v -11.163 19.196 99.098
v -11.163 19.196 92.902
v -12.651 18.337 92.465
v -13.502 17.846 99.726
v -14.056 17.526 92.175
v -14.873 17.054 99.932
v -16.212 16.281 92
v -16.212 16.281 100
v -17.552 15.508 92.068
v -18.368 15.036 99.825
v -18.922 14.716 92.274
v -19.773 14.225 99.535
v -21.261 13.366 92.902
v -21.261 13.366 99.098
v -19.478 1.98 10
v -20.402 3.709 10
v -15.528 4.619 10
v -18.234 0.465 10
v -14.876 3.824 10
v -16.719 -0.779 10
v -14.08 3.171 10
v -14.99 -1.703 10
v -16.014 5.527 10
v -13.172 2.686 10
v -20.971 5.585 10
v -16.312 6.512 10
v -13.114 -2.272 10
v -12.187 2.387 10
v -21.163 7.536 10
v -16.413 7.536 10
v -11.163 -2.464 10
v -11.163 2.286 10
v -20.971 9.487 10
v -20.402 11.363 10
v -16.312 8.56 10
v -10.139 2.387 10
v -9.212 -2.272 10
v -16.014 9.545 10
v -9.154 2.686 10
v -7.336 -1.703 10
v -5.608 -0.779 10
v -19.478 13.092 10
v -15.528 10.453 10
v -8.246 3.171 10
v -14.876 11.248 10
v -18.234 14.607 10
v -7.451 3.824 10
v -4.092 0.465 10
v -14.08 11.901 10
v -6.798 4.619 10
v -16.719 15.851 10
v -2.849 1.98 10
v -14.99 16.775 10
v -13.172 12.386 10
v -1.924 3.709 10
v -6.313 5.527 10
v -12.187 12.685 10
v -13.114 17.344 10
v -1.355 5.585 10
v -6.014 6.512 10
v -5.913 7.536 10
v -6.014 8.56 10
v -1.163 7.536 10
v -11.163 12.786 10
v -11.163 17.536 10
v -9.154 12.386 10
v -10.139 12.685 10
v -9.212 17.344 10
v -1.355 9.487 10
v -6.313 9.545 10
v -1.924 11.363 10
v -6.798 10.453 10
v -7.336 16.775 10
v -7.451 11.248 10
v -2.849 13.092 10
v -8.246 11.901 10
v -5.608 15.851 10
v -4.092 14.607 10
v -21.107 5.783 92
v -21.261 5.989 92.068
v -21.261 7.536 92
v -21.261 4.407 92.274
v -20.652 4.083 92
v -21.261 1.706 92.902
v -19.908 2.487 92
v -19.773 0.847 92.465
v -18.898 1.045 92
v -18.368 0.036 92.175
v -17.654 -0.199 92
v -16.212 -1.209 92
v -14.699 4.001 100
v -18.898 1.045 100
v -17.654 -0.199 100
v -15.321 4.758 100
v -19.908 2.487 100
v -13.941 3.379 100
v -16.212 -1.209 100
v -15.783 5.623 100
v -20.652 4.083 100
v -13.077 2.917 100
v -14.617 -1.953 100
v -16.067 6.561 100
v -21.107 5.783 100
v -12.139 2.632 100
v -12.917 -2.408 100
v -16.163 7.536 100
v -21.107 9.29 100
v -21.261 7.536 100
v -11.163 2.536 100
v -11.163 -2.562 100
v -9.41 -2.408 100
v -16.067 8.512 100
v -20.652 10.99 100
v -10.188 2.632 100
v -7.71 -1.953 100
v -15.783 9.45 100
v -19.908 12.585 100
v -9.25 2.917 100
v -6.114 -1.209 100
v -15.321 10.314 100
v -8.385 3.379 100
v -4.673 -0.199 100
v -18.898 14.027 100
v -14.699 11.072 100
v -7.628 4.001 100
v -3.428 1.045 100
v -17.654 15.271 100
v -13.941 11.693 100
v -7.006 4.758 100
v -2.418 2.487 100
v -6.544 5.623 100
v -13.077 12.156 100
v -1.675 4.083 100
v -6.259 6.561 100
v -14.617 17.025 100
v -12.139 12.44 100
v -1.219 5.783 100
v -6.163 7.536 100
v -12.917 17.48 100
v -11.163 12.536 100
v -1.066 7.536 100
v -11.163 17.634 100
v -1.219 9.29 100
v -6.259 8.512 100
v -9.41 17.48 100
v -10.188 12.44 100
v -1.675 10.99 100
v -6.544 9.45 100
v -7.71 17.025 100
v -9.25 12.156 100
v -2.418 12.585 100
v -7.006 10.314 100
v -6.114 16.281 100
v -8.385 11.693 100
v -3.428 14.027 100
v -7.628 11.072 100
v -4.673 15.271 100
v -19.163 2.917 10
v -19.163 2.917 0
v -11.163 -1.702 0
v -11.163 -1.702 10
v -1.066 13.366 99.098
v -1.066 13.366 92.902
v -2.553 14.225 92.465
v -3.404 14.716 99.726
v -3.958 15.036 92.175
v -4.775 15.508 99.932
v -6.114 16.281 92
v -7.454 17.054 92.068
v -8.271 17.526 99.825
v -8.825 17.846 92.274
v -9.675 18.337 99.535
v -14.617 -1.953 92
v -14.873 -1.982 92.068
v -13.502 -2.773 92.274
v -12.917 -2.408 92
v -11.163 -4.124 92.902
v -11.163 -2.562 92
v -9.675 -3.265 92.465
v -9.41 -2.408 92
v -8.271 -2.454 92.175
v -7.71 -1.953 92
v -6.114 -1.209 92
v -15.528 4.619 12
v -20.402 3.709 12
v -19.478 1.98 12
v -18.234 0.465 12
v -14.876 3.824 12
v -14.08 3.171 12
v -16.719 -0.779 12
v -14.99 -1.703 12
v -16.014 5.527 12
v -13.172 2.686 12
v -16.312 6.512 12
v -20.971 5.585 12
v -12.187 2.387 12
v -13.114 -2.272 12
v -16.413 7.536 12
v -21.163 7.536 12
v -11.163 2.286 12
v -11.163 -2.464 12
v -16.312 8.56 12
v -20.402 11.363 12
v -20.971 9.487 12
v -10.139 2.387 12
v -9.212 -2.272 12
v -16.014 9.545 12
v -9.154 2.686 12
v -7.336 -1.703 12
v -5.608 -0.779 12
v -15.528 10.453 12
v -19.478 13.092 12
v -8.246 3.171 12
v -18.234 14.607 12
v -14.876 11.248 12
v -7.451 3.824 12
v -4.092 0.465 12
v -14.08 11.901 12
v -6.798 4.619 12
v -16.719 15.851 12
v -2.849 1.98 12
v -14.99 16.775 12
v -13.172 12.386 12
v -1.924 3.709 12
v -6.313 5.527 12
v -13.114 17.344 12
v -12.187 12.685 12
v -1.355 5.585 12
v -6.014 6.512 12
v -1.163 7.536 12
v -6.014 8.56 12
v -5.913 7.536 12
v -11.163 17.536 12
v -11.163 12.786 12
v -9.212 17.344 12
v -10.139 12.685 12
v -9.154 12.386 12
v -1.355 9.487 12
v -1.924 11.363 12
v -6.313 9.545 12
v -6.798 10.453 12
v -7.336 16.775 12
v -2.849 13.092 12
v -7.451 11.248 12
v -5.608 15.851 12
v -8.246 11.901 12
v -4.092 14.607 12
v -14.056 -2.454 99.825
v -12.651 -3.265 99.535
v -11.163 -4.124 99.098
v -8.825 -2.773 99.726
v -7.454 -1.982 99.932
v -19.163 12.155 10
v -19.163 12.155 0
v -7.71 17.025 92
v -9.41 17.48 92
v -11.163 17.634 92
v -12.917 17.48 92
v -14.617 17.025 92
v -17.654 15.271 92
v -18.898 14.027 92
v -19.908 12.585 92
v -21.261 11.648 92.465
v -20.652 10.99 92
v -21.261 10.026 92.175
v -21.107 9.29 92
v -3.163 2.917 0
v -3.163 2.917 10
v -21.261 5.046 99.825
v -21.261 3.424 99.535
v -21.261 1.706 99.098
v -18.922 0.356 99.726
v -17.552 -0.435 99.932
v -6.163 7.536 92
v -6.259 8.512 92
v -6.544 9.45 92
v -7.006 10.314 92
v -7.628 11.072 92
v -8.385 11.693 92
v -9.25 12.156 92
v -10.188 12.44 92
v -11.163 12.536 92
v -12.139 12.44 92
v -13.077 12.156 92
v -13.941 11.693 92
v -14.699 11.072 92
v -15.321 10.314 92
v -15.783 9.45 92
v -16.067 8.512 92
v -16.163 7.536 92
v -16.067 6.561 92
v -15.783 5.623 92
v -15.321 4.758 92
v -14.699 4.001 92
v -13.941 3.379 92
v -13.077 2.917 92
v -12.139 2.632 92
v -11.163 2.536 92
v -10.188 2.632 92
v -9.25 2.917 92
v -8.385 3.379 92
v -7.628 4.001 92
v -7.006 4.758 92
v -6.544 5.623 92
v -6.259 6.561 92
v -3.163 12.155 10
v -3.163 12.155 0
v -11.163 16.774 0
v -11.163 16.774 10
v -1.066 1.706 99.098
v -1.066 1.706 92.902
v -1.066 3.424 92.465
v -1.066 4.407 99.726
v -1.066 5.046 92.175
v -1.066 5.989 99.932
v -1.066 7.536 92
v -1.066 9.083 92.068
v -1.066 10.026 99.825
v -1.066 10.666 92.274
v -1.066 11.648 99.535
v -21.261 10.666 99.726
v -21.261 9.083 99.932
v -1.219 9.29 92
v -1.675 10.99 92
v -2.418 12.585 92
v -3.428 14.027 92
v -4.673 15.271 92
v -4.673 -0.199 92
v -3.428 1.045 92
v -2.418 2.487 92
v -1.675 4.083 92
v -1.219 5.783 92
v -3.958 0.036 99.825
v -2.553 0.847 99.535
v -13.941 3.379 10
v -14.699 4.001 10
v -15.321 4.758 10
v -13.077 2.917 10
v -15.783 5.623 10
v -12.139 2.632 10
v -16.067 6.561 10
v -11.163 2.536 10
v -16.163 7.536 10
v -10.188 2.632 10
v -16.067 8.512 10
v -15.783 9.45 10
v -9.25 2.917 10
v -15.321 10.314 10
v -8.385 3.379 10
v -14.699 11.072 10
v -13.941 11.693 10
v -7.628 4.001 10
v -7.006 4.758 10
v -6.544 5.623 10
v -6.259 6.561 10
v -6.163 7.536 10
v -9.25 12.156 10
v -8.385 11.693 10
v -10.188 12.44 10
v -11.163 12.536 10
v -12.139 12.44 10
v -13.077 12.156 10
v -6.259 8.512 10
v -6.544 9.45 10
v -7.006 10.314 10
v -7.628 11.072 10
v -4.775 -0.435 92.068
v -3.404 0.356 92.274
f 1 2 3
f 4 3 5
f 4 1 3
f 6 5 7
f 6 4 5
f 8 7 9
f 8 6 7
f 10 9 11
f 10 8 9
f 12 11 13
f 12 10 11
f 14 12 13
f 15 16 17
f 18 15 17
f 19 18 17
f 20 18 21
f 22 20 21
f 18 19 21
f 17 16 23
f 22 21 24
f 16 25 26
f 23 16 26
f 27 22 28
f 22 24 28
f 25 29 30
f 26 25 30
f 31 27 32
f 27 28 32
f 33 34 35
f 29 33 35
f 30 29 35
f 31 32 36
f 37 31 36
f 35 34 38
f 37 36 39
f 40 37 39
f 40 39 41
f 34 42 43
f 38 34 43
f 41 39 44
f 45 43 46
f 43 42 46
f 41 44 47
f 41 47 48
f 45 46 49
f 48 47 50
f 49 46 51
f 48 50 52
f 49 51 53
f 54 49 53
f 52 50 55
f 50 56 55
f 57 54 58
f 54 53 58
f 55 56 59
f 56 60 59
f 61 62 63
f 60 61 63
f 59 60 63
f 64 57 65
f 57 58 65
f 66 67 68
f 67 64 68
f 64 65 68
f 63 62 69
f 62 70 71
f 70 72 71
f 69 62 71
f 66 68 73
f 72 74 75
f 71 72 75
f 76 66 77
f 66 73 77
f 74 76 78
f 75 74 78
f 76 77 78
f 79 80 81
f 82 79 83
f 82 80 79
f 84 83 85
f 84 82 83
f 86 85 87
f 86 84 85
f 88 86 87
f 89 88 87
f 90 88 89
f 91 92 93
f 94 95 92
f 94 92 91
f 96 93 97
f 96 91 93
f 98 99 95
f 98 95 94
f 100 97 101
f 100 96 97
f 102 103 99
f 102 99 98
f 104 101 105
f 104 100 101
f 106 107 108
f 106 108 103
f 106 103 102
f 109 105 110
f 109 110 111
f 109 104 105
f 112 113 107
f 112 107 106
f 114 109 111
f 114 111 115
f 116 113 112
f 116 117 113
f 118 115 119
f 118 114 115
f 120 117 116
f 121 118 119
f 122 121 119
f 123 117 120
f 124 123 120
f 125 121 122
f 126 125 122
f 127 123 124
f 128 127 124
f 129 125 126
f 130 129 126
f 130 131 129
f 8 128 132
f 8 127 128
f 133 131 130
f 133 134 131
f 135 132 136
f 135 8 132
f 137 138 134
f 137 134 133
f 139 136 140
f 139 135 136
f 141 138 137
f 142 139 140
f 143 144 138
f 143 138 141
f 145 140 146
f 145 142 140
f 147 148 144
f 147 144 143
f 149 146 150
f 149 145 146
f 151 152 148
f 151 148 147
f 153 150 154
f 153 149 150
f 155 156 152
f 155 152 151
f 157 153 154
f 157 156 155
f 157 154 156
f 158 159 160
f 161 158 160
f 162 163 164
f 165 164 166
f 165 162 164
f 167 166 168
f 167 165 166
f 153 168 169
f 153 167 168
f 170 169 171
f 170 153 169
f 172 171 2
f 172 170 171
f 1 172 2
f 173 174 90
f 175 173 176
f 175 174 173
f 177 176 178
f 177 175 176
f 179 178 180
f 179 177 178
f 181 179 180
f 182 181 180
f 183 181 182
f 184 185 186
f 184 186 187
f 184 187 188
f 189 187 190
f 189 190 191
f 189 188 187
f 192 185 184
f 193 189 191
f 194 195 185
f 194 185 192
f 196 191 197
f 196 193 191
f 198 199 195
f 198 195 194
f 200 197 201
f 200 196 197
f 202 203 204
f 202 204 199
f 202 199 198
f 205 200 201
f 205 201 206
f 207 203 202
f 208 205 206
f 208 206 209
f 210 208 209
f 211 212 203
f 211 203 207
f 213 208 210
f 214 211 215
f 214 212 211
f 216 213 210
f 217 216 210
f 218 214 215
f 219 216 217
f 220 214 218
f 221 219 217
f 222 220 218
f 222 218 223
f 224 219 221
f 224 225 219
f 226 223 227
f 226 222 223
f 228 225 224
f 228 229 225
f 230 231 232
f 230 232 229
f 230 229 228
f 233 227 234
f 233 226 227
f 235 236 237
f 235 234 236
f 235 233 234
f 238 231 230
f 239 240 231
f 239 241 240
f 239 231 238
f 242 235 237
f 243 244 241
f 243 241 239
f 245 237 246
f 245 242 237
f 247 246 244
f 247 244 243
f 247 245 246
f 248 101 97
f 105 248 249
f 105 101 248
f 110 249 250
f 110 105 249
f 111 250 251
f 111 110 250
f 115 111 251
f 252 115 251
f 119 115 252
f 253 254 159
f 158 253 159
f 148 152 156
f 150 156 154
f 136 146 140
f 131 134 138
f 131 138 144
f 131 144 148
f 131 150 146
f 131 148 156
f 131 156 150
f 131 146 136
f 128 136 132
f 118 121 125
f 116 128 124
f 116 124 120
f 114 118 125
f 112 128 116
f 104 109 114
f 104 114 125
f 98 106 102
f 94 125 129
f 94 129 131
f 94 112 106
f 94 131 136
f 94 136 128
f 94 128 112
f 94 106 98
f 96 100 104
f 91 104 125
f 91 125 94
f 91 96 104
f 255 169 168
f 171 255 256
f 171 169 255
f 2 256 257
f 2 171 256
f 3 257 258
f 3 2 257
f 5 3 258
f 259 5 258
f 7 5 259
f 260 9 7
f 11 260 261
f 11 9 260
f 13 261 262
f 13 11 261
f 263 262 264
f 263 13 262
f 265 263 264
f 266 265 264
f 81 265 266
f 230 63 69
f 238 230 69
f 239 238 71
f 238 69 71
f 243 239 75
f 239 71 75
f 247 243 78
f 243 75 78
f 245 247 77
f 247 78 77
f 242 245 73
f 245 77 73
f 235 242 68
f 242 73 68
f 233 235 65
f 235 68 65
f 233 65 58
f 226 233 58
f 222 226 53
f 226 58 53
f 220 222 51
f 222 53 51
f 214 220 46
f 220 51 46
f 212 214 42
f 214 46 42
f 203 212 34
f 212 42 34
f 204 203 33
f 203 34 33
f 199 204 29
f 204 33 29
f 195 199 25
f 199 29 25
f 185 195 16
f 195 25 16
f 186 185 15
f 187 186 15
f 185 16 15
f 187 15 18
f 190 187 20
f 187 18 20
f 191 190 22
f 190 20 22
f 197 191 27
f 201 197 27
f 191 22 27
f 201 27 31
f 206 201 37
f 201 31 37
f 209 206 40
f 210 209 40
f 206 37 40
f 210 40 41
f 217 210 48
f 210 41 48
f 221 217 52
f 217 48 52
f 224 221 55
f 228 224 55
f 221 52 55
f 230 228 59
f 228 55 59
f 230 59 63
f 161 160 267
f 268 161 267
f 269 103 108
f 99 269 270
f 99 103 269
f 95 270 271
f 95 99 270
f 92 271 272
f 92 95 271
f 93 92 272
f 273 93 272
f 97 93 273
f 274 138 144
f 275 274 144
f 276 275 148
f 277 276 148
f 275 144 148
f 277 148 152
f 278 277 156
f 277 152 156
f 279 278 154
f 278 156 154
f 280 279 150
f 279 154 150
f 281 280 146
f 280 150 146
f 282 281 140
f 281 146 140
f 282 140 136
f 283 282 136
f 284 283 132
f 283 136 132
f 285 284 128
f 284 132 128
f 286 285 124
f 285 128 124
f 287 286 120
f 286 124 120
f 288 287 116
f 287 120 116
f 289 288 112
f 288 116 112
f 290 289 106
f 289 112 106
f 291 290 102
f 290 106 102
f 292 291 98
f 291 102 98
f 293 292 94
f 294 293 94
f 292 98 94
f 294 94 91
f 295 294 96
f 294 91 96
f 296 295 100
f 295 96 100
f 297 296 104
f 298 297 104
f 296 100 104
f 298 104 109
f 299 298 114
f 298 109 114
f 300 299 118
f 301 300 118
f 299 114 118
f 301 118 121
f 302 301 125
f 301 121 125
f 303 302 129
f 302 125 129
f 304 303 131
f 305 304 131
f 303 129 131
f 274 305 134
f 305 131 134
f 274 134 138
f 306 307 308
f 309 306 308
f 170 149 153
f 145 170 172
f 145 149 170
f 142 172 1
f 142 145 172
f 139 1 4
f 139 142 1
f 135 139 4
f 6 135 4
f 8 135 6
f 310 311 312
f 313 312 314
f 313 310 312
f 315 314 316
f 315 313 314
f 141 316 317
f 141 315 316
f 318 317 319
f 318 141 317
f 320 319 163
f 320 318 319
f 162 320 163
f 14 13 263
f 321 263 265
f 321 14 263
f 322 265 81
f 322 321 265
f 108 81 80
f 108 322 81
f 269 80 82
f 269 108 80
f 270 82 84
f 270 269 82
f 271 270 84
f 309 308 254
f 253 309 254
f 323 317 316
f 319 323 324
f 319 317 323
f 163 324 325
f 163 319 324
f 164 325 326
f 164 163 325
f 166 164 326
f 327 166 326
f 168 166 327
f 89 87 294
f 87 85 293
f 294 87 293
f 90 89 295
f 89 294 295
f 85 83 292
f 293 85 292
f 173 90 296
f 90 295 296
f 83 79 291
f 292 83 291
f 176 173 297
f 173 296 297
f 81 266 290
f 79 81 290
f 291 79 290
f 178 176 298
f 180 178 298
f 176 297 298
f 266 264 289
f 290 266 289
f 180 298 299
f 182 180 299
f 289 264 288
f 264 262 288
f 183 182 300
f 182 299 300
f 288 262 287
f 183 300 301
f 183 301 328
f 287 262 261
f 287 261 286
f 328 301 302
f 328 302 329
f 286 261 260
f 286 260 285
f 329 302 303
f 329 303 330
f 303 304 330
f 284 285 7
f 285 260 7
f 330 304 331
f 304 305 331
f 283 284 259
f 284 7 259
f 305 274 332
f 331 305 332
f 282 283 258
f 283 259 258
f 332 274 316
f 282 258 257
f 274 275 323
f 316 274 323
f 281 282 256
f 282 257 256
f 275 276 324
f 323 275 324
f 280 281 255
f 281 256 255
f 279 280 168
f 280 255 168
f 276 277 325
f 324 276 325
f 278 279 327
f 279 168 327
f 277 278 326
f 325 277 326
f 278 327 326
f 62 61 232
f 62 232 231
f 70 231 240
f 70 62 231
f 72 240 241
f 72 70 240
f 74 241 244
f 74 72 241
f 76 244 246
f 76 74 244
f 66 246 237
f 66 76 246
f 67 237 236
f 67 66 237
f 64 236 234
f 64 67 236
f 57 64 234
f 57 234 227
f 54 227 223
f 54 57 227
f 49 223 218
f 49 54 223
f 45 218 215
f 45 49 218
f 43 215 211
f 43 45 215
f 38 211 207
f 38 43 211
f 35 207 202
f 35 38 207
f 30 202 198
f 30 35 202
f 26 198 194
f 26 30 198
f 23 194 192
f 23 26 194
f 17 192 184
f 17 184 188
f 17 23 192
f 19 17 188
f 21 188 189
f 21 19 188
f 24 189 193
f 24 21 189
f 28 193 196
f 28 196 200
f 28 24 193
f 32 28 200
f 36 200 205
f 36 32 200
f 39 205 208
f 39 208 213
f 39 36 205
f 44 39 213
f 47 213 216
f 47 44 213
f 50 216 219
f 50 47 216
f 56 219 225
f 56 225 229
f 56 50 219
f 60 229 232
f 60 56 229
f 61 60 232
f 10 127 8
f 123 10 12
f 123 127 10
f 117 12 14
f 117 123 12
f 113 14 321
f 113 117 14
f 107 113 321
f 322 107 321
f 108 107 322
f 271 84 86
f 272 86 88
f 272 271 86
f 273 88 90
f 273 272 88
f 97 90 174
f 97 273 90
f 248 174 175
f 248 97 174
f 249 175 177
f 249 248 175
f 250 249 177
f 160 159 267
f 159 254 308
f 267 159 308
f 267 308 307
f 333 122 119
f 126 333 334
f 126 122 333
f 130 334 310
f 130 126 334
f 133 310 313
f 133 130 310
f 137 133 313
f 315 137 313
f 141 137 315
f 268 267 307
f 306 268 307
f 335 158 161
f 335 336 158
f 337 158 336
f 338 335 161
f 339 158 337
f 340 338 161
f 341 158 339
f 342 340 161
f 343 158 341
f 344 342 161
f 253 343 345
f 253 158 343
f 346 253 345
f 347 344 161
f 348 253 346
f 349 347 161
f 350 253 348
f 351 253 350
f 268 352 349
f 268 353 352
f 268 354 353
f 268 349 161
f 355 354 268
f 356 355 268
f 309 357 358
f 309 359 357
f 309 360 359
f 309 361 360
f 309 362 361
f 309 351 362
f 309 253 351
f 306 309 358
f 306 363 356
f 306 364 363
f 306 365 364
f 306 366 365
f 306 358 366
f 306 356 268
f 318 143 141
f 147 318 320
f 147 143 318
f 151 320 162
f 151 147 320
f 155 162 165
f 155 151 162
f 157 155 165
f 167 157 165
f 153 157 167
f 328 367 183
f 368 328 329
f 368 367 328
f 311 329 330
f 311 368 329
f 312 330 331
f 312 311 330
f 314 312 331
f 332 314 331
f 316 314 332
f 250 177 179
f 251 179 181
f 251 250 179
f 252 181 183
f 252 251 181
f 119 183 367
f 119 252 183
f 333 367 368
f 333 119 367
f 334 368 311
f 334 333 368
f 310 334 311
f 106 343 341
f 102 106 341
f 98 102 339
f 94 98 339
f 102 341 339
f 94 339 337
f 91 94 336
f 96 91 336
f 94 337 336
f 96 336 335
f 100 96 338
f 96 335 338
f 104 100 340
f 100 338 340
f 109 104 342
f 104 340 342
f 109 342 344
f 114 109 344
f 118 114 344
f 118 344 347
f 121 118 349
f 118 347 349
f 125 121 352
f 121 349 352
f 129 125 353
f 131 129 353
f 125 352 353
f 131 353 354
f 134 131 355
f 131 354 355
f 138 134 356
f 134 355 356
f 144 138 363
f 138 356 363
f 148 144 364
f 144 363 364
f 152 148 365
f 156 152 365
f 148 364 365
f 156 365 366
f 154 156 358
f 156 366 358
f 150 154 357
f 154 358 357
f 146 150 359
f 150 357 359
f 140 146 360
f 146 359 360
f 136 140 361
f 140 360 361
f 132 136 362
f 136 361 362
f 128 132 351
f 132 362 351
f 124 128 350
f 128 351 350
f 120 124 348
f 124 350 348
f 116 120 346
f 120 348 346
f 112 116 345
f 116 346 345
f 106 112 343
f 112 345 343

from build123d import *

# Parameters (mm, degrees)
SKETCH1_R           = 5
BOSS_EXTRUDE1_DEPTH = 10
BOSS_EXTRUDE2_START = 10
SKETCH1_3_R         = 5
BOSS_EXTRUDE2_DEPTH = 90
BOSS_EXTRUDE3_START = 10
SKETCH3_R           = 10
SKETCH3_R_2         = 5.25
BOSS_EXTRUDE3_DEPTH = 2
SKETCH4_R           = 5
BOSS_EXTRUDE4_DEPTH = 8


with BuildPart() as part:
    # Sketch1 → Boss-Extrude1 (new body)
    # profile 1 of 2: a face of its own
    with BuildSketch(Plane.XY):
        Polygon((-11.163210479, -1.701501358), (-3.163210479, 2.917300796), (-3.163210479, 12.154905103), (-11.163210479, 16.773707256), (-19.163210479, 12.154905103), (-19.163210479, 2.917300796), align=None)
        with Locations((-11.163210479, 7.536102949)):
            Circle(SKETCH1_R, mode=Mode.SUBTRACT)
    # profile 2 of 2: a face of its own
    with BuildSketch(Plane.XY):
        with Locations((-11.163210479, 7.536102949)):
            Circle(SKETCH1_R)
    extrude(amount=BOSS_EXTRUDE1_DEPTH)

    # Sketch1<3> → Boss-Extrude2 (add)
    with BuildSketch(Plane.XY.offset(BOSS_EXTRUDE2_START)):
        with Locations(Location((-11.163210479, 7.536102949, 0), (0, 0, 180))):
            Circle(SKETCH1_3_R)
    extrude(amount=BOSS_EXTRUDE2_DEPTH)


with BuildPart() as body_2:
    # Sketch3 → Boss-Extrude3 (new body)
    with BuildSketch(Plane.XY.offset(BOSS_EXTRUDE3_START)):
        with Locations((-11.163210479, 7.536102949)):
            Circle(SKETCH3_R)
        with Locations((-11.163210479, 7.536102949)):
            Circle(SKETCH3_R_2, mode=Mode.SUBTRACT)
    extrude(amount=BOSS_EXTRUDE3_DEPTH)


with BuildPart() as body_3:
    # Sketch4 → Boss-Extrude4 (new body)
    with BuildSketch(Plane.XY.offset(100)):
        Polygon((-11.163210479, -4.123618998), (-1.065595071, 1.706241975), (-1.065595071, 13.365963923), (-11.163210479, 19.195824897), (-21.260825886, 13.365963923), (-21.260825886, 1.706241975), align=None)
        with Locations((-11.163210479, 7.536102949)):
            Circle(SKETCH4_R, mode=Mode.SUBTRACT)
    extrude(amount=-BOSS_EXTRUDE4_DEPTH)

    # Sketch5 → Cut-Revolve1 (revolve, cut)
    with BuildSketch(Plane(origin=(0, 7.536102949, 0), x_dir=(-1, 0, 0), z_dir=(0, -1, 0))):
        Polygon((28.189029116, -96), (14.332622656, -104), (14.332622656, -108.5), (39.332622656, -108.5), (39.332622656, -83.5), (14.332622656, -83.5), (14.332622656, -88), align=None)
    revolve(axis=Axis((-11.163210479, 7.536102949, 51.6), (0, 0, 1)), mode=Mode.SUBTRACT)


solid = Compound([part.part, body_2.part, body_3.part])
